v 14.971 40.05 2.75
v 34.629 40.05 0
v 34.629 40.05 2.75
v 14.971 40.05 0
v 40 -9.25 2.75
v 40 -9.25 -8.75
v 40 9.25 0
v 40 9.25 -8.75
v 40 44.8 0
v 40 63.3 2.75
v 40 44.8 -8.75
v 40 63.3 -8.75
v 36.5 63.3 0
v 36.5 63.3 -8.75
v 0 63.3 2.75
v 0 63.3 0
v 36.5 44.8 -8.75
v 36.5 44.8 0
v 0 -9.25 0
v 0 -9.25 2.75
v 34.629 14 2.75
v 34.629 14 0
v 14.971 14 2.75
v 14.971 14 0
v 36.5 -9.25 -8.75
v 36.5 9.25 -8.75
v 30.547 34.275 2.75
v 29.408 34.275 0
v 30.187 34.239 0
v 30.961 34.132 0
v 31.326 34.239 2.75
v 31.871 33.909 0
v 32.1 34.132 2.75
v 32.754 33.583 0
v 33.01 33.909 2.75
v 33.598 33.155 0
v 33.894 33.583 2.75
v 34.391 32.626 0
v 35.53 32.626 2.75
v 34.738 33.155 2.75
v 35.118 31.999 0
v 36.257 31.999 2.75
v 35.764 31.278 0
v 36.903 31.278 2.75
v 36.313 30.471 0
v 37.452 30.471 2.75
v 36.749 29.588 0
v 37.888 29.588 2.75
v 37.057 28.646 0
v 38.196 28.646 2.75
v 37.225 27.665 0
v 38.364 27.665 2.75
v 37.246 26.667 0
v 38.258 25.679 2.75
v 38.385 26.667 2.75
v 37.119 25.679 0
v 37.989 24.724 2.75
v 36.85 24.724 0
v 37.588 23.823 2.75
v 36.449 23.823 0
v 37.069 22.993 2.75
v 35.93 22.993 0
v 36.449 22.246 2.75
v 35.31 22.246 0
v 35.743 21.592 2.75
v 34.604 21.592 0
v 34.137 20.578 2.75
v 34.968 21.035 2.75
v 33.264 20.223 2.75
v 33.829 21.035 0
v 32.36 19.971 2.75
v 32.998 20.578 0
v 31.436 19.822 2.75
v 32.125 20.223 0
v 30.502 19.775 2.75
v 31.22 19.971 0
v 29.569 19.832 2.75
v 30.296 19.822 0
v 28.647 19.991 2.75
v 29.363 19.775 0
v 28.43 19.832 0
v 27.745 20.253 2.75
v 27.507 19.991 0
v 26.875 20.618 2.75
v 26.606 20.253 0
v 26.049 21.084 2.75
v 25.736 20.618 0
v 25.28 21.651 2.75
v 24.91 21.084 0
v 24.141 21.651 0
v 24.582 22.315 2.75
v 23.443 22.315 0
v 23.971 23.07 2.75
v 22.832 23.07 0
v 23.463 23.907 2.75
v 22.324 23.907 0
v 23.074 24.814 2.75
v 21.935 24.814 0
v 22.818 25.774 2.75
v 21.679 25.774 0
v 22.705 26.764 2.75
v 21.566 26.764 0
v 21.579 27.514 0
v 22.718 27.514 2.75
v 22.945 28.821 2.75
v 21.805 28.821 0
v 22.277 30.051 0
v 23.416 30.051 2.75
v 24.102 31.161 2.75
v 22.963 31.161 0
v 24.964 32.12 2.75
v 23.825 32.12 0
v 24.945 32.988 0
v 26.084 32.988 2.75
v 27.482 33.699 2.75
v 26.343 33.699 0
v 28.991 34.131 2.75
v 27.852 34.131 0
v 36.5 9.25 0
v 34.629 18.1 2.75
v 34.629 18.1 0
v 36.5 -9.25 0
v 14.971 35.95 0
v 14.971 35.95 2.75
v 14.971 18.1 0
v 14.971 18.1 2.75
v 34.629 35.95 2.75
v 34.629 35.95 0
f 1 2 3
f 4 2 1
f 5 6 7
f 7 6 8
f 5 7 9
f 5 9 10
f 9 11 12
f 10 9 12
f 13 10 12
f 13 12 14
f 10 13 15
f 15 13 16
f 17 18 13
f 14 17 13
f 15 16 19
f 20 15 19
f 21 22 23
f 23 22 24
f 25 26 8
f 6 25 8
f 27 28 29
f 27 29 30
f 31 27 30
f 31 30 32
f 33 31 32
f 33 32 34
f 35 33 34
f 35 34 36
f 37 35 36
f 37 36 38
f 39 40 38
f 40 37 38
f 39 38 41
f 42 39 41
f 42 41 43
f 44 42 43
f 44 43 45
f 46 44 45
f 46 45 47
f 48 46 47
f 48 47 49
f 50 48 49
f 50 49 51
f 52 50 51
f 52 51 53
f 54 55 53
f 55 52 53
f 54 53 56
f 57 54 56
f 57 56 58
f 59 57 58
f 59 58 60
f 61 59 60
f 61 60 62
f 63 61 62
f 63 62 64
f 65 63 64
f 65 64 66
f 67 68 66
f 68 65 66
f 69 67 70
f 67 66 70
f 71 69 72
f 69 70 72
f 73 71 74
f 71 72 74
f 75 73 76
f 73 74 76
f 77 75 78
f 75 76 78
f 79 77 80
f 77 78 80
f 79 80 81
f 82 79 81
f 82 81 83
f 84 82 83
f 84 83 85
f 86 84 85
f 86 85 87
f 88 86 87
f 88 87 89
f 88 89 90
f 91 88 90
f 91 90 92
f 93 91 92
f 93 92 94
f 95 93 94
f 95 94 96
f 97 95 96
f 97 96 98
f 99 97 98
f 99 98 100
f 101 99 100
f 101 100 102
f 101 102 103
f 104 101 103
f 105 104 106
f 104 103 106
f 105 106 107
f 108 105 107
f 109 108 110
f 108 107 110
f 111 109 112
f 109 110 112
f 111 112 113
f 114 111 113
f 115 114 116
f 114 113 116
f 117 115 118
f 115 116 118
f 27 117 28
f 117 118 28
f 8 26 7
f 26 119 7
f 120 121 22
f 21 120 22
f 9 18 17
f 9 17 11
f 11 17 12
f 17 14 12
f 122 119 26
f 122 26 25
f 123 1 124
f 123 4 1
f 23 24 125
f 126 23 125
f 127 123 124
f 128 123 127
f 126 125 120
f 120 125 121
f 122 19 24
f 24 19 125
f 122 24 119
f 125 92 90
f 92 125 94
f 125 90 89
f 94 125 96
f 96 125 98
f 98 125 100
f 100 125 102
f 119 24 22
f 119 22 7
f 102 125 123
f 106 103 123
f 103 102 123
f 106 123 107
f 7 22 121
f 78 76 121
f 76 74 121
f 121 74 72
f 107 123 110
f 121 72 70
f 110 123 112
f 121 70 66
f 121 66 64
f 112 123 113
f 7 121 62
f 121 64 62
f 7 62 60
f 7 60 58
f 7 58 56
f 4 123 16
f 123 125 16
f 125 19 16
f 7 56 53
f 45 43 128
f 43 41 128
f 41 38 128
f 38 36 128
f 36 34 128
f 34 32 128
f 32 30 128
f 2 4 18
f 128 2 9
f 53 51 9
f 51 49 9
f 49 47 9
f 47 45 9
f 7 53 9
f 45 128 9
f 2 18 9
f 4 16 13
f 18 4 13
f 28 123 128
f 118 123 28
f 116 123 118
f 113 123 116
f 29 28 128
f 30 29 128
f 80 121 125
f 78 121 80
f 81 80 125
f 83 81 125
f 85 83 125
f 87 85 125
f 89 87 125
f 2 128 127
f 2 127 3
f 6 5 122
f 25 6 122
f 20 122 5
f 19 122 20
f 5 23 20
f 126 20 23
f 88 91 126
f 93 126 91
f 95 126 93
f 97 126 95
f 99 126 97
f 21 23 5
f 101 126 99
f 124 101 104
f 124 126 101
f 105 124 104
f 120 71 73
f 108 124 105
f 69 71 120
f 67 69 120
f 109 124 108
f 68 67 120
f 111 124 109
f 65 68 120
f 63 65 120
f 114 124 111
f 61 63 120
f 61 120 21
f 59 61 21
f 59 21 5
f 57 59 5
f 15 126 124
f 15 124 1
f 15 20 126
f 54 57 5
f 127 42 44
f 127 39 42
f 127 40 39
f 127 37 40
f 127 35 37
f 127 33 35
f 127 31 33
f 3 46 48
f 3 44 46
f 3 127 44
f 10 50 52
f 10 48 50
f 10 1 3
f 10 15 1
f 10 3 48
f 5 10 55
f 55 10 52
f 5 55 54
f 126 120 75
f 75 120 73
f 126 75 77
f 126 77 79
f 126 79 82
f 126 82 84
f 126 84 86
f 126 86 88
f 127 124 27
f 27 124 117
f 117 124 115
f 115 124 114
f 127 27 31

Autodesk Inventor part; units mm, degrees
ref_plane "YZ Plane" through (0, 0, 0) normal (1, 0, 0) x (0, 1, 0)
ref_plane "XZ Plane" through (0, 0, 0) normal (0, 1, 0) x (-1, 0, 0)
sketch "Sketch1" plane through (0, 0, 0) normal (0, 0, 1) x (1, 0, 0)
  line L0 (0, 44.8) -> (0, 9.25)
  line L1 (0, 44.8) -> (40, 44.8)
  line L2 (0, 9.25) -> (40, 9.25)
  line L3 (40, 9.25) -> (40, 44.8)
  line L4 (14.9707, 35.95) -> (34.6293, 35.95)
  line L5 (34.6293, 35.95) -> (34.6293, 40.05)
  line L6 (34.6293, 40.05) -> (14.9707, 40.05)
  line L7 (14.9707, 40.05) -> (14.9707, 35.95)
  line L8 (30.8793, 39.05) -> (28.5722, 39.05) construction
  line L9 (30.8793, 39.05) -> (30.8793, 36.95) construction
  line L10 (30.8793, 36.95) -> (28.5722, 36.95) construction
  line L11 (28.5722, 39.05) -> (28.5722, 36.95) construction
  line L12 (30.8793, 39.05) -> (30.8793, 40.05) construction
  line L13 (30.8793, 36.95) -> (30.8793, 35.95) construction
  line L14 (21.0278, 39.05) -> (18.7207, 39.05) construction
  line L15 (21.0278, 39.05) -> (21.0278, 36.95) construction
  line L16 (21.0278, 36.95) -> (18.7207, 36.95) construction
  line L17 (18.7207, 39.05) -> (18.7207, 36.95) construction
  line L18 (18.7207, 39.05) -> (14.9707, 39.05) construction
  line L19 (30.8793, 39.05) -> (34.6293, 39.05) construction
  line L20 (0, -9.25) -> (0, 9.25) projected
  line L21 (40, 27.025) -> (0, 27.025) construction
  line L22 (14.9707, 18.1) -> (34.6293, 18.1)
  line L23 (34.6293, 18.1) -> (34.6293, 14)
  line L24 (34.6293, 14) -> (14.9707, 14)
  line L25 (14.9707, 14) -> (14.9707, 18.1)
  line L26 (40, 9.25) -> (40, -9.25)
  line L27 (40, -9.25) -> (0, -9.25)
  line L28 (32.375, -9.25) -> (32.375, 9.25) projected
  line L29 (36.5, 9.25) -> (36.5, -9.3) projected
  line L30 (0, 44.8) -> (40, 44.8)
  line L31 (0, 63.3) -> (0, 44.8)
  line L32 (40, 44.8) -> (40, 63.3)
  line L33 (40, 63.3) -> (0, 63.3)
  line L34 (32.375, 63.3) -> (32.375, 44.8)
  line L35 (36.5, 44.8) -> (36.5, 63.35)
  point P0 (36.5, -9.25)
  point P1 (36.5, 63.3)
  dimension "d1" = 35.55
  dimension "d2" = 1
  dimension "d3" = 3.75
  dimension "d4" = 40
extrude "Extrusion1" add sketch "Sketch1" along normal blind 2.75
ref_plane "Work Plane1" through (36.5, 52.55, -8.75) normal (0, 0, 1) x (1, 0, 0)
extrude "Extrusion2" add sketch "Sketch1" against normal up to surface (8.75 mm away) contours L35 L33 L32 L1 | L2 L26 L27 L29
ref_plane "Work Plane2" through (27.7797, 32.4377, -8.357) normal (-0.3827, 0, -0.9239) x (-0.4619, -0.866, 0.1913)
sketch "Sketch3" plane through (27.7797, 32.4377, -8.357) normal (-0.3827, 0, -0.9239) x (-0.4619, -0.866, 0.1913)
  circle A0 centre (5.5343, -1.2396) radius 6.25 construction
  ellipse E0 centre (5.5343, -1.2396) end of major axis (-0.7444, 2.3854) minor radius 7.25
  line L0 (10.947, -4.3646) -> (11.813, -4.8646) construction
  line L1 (2.4093, -6.6522) -> (1.9093, -7.5183) construction
  line L2 (0.6415, -9.7142) -> (19.1191, 22.2899) construction
  point P0 (42.5234, 8.7774)
  dimension "d9" = 1
extrude "Extrusion3" cut sketch "Sketch3" against normal blind 17.75
properties part number "Encoderadapter"
